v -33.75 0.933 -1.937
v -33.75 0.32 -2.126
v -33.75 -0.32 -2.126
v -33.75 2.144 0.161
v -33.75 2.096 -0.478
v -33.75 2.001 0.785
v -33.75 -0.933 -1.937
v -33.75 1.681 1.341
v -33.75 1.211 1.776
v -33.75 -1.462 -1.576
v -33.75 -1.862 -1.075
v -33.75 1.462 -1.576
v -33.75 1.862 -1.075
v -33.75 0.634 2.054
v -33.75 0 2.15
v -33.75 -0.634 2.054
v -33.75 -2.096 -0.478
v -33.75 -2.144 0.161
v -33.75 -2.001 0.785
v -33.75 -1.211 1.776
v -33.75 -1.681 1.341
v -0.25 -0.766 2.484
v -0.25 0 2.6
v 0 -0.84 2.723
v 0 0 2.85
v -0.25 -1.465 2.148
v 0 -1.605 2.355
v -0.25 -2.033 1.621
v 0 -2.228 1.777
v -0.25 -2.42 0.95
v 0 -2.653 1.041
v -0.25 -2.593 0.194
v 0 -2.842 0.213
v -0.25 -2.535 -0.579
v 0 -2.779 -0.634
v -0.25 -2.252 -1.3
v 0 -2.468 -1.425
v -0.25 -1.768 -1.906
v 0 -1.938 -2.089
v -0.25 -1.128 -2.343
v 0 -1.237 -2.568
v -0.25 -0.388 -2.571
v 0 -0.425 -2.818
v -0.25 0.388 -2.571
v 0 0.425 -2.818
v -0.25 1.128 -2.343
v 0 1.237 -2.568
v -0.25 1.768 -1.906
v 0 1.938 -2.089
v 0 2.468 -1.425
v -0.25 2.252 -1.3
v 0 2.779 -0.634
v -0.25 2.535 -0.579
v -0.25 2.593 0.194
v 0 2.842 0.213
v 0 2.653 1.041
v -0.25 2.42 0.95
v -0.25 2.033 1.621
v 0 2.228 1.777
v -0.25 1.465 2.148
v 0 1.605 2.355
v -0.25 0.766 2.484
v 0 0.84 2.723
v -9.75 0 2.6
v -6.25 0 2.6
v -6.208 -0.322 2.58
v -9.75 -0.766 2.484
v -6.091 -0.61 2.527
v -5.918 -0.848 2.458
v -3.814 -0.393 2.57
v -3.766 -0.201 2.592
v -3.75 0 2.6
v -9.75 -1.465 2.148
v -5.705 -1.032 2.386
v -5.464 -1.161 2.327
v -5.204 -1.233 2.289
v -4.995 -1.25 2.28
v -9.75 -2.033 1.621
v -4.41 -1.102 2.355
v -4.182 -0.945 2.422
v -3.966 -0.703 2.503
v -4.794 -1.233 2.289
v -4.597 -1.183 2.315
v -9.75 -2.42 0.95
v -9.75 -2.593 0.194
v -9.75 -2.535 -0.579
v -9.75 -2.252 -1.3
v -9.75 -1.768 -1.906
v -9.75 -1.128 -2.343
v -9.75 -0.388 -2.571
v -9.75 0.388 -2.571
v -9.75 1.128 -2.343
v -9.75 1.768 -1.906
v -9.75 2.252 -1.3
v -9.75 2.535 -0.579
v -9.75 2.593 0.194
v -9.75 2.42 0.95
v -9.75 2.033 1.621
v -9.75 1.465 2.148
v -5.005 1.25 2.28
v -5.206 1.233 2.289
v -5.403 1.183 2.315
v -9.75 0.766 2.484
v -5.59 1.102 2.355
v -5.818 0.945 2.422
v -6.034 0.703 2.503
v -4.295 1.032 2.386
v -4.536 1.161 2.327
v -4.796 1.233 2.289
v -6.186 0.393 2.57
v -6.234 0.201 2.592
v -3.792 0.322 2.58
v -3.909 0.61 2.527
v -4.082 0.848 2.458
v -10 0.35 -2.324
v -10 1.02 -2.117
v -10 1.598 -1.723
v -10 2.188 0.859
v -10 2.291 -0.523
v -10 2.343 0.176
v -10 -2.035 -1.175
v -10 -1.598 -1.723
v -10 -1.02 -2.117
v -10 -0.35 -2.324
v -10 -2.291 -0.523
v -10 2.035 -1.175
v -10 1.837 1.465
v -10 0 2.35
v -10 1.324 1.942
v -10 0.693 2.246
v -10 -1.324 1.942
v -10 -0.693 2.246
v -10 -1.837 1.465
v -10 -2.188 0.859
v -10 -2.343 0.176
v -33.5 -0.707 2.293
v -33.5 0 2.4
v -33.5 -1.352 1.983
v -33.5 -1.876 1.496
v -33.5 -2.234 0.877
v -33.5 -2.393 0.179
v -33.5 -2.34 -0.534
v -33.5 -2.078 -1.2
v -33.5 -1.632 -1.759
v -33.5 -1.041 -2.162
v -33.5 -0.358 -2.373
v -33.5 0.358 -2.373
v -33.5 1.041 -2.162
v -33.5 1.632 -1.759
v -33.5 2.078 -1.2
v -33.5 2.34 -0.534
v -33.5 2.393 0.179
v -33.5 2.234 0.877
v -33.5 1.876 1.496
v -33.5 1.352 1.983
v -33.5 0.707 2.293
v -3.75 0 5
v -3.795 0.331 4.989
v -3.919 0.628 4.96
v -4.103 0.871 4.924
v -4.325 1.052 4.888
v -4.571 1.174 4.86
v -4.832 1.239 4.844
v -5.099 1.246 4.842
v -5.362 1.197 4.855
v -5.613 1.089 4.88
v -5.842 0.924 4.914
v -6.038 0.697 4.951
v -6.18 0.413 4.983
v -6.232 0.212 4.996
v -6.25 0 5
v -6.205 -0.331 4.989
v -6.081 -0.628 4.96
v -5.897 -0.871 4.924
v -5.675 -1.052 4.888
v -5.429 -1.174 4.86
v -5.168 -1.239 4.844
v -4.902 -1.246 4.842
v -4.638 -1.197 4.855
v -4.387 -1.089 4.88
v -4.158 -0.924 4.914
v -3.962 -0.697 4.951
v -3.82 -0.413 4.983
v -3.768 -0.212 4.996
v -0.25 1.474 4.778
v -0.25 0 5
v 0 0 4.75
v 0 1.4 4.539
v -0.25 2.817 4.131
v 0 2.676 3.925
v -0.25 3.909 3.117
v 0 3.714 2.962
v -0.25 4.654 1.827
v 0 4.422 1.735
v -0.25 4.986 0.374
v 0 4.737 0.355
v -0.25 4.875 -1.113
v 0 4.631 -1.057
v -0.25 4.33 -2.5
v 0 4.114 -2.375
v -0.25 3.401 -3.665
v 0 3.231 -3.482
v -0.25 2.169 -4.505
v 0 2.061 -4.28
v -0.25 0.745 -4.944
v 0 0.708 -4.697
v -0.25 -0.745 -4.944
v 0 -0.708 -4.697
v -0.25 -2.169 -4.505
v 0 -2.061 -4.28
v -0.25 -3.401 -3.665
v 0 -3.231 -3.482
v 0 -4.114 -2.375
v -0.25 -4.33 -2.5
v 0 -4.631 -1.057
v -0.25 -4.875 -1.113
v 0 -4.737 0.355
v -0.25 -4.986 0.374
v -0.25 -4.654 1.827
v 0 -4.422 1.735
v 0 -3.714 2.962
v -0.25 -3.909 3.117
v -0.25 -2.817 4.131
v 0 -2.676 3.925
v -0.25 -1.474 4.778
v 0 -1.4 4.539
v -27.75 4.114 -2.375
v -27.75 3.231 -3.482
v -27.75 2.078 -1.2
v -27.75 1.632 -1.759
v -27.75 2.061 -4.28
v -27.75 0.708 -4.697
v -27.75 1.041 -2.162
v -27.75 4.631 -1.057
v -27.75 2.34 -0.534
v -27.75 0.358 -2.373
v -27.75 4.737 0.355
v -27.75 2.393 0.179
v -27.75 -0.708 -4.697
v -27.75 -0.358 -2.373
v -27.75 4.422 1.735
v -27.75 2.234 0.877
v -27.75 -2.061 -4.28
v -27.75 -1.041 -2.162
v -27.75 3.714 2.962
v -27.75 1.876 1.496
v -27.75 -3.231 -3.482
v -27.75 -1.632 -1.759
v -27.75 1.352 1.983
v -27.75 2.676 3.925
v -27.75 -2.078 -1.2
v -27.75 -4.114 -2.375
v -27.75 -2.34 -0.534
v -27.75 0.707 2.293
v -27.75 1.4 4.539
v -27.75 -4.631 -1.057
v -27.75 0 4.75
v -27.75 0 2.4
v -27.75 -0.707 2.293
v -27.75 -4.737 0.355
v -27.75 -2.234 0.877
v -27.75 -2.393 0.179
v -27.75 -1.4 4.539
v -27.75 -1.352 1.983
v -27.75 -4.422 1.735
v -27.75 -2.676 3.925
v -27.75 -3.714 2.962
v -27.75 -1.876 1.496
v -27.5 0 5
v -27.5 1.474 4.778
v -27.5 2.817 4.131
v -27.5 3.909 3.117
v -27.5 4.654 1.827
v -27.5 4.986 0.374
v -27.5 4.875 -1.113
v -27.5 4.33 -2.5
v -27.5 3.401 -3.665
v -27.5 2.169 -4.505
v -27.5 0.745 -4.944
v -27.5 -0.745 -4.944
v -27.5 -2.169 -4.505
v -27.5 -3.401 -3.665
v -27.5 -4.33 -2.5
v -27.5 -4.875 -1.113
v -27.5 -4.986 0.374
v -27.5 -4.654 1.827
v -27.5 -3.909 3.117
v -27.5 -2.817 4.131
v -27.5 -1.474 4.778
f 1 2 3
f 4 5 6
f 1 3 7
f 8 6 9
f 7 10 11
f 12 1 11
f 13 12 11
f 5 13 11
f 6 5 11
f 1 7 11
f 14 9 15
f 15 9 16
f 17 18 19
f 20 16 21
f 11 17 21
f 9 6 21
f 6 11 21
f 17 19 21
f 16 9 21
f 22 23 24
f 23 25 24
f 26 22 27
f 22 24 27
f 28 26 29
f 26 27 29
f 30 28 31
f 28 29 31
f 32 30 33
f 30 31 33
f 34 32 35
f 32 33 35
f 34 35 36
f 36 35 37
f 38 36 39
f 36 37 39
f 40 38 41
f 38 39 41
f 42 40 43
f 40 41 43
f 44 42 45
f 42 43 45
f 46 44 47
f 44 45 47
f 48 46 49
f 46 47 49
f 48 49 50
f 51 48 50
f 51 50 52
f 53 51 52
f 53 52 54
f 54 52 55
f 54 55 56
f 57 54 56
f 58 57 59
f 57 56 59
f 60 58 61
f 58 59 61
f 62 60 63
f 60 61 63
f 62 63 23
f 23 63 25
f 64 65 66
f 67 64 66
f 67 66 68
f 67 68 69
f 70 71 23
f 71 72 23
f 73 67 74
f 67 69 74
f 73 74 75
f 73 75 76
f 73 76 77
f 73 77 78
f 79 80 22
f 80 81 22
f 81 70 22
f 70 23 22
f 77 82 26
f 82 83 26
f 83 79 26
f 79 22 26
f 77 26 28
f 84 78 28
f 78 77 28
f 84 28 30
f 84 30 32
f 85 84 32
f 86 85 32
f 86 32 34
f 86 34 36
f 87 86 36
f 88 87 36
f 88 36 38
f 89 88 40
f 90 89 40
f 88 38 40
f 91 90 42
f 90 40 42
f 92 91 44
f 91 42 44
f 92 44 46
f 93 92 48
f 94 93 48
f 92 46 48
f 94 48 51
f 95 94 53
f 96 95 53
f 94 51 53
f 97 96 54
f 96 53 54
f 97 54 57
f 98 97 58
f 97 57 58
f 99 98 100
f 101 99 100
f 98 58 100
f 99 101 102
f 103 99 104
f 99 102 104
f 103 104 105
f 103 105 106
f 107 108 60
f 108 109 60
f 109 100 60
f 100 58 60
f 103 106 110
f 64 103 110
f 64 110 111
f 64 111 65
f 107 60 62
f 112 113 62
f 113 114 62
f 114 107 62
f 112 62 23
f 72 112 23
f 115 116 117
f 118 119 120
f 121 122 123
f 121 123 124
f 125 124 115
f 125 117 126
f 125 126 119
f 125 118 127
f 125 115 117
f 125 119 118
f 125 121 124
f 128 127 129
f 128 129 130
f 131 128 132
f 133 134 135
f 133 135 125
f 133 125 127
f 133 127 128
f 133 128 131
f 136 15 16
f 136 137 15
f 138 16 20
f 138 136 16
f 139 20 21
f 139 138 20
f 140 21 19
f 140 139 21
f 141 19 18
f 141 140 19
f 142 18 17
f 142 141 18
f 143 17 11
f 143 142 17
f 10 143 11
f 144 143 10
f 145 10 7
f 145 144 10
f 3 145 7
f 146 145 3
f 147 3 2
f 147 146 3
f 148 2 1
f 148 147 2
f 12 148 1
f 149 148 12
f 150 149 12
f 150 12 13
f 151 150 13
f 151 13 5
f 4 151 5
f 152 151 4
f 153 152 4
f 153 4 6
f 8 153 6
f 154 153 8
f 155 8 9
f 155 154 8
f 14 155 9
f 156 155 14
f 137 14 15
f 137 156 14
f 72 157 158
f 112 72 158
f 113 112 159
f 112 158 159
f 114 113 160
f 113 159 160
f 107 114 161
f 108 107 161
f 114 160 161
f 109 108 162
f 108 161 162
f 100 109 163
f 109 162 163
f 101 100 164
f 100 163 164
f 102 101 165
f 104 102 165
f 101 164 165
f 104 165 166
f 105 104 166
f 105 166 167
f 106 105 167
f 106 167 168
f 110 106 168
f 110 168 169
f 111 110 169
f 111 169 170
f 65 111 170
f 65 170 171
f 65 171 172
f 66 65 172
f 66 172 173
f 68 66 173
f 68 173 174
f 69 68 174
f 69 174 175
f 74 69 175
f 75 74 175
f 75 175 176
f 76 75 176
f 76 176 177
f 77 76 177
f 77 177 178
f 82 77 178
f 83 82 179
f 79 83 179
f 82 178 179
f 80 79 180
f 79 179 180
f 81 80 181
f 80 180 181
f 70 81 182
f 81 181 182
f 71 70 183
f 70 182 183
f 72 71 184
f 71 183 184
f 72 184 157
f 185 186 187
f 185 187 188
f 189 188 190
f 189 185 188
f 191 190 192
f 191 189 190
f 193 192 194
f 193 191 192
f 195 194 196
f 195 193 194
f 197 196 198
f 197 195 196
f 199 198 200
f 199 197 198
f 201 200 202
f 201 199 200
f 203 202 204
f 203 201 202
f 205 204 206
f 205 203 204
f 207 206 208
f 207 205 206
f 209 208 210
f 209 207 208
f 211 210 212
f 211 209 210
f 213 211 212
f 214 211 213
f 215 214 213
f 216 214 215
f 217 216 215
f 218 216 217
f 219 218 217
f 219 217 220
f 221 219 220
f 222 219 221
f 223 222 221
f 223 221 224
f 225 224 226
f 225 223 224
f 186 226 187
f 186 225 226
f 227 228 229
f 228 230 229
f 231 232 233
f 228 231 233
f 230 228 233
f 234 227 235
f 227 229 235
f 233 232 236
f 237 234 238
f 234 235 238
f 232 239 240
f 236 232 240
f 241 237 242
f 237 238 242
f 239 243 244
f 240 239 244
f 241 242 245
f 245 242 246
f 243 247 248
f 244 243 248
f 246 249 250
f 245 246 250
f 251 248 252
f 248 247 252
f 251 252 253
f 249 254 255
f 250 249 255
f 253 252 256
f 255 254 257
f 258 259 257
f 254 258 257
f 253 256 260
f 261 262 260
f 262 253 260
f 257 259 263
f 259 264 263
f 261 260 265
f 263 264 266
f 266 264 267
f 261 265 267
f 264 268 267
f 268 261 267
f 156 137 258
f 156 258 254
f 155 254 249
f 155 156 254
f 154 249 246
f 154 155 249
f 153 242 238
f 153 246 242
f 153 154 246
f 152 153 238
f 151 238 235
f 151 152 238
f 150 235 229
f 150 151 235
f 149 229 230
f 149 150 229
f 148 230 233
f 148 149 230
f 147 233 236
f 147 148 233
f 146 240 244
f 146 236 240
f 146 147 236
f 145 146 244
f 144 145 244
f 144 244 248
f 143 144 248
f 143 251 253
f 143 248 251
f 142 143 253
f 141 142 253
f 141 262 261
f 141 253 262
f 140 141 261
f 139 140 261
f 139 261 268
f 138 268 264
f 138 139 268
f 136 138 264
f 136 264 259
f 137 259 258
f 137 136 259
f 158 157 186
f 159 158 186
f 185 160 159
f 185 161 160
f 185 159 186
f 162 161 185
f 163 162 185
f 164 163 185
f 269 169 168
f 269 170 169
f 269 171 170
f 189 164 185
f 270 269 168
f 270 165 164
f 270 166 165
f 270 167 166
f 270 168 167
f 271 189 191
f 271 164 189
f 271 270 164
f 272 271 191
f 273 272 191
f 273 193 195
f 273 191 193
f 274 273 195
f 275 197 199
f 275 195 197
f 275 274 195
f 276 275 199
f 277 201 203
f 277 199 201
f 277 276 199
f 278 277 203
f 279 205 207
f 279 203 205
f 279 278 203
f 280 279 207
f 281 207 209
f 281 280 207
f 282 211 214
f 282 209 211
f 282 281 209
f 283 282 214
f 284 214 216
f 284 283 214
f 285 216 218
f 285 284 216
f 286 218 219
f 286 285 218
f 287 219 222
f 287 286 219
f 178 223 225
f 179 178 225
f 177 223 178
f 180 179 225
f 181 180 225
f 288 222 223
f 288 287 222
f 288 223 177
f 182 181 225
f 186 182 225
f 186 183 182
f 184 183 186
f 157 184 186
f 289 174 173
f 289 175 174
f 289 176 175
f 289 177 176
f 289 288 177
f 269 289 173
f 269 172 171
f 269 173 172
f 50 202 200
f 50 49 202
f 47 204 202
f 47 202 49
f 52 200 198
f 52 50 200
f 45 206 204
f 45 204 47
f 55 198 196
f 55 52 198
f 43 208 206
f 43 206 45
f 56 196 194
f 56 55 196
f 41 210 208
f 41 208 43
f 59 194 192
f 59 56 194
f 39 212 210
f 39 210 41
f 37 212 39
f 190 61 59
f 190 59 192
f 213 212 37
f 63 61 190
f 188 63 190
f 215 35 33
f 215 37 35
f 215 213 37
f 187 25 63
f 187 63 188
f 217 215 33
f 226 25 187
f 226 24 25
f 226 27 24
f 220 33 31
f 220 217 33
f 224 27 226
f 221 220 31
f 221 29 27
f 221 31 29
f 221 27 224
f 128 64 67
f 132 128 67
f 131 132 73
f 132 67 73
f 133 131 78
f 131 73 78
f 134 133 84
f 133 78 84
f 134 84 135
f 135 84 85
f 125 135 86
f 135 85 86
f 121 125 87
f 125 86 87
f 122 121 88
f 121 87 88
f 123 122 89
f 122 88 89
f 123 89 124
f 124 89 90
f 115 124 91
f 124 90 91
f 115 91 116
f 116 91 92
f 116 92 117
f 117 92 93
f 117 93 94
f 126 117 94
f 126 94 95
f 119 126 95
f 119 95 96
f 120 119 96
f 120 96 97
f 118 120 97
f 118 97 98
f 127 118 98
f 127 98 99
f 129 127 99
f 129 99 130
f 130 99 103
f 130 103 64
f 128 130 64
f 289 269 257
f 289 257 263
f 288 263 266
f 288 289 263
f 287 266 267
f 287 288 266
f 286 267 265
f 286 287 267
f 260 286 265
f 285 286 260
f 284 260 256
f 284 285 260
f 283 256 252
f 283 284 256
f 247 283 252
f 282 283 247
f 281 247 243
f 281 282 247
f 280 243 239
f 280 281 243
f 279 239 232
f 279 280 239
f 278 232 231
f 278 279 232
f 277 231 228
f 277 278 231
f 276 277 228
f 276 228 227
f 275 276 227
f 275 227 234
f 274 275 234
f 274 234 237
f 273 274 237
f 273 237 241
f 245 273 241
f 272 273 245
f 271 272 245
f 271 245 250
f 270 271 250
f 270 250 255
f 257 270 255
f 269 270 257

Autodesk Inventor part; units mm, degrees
ref_plane "YZ Plane" through (0, 0, 0) normal (1, 0, 0) x (0, 1, 0)
ref_plane "XZ Plane" through (0, 0, 0) normal (0, 1, 0) x (-1, 0, 0)
sketch "Sketch2" plane through (0, 0, 0) normal (0, 1, 0) x (-1, 0, 0)
  line L0 (0.25, 5) -> (27.5, 5)
  line L1 (27.75, 4.75) -> (27.75, 2.4)
  line L2 (27.75, 2.4) -> (33.5, 2.4)
  line L3 (33.75, 2.15) -> (33.75, 0)
  line L4 (9.75, 2.6) -> (0.25, 2.6)
  line L5 (0, 2.85) -> (0, 4.75)
  line L6 (10, 2.35) -> (10, 0)
  line L7 (33.75, 2.15) -> (33.5, 2.4)
  line L8 (27.75, 4.75) -> (27.5, 5)
  line L9 (0.25, 5) -> (0, 4.75)
  line L10 (0, 2.85) -> (0.25, 2.6)
  line L11 (9.75, 2.6) -> (10, 2.35)
  line L12 (33.75, 0) -> (10, 0)
  point P0 (0, 0)
  point P1 (0, 5)
  point P2 (27.75, 5)
  point P3 (33.75, 2.4)
  point P4 (10, 2.6)
  point P5 (0, 2.6)
  dimension "d1" = 27.75
  dimension "d2" = 2.6
  dimension "d3" = 6
  dimension "d4" = 5
  dimension "d5" = 0.25
  dimension "d6" = 0.25
  dimension "d7" = 0.25
  dimension "d8" = 0.25
  dimension "d9" = 0.25
  dimension "d10" = 0.25
  dimension "d11" = 0.25
  dimension "d12" = 0.25
  dimension "d13" = 0.25
  dimension "d14" = 0.25
revolve "Revolution1" add sketch "Sketch2" angle 360 about axis through (-33.75, 0, 0) along (1, 0, 0)
ref_plane "Work Plane1" through (0, 0, 5) normal (0, 0, 1) x (1, 0, 0)
sketch "Sketch3" plane through (0, 0, 5) normal (0, 0, 1) x (1, 0, 0)
  circle A0 centre (-5, 0) radius 1.25
  point P0 (0, 0)
  dimension "d17" = 2.5
extrude "Extrusion1" cut sketch "Sketch3" against normal blind 5
thread "Thread1" size "M3x0.5" class "6H" standard "ISO Metric profile" full length
equation "\"d6\" = d5"
equation "\"d7\" = d5"
equation "\"d8\" = d7"
equation "\"d9\" = d5"
equation "\"d10\" = d9"
equation "\"d11\" = d5"
equation "\"d12\" = d11"
equation "\"d14\" = d13"
properties part number "ParrallelShaft"
